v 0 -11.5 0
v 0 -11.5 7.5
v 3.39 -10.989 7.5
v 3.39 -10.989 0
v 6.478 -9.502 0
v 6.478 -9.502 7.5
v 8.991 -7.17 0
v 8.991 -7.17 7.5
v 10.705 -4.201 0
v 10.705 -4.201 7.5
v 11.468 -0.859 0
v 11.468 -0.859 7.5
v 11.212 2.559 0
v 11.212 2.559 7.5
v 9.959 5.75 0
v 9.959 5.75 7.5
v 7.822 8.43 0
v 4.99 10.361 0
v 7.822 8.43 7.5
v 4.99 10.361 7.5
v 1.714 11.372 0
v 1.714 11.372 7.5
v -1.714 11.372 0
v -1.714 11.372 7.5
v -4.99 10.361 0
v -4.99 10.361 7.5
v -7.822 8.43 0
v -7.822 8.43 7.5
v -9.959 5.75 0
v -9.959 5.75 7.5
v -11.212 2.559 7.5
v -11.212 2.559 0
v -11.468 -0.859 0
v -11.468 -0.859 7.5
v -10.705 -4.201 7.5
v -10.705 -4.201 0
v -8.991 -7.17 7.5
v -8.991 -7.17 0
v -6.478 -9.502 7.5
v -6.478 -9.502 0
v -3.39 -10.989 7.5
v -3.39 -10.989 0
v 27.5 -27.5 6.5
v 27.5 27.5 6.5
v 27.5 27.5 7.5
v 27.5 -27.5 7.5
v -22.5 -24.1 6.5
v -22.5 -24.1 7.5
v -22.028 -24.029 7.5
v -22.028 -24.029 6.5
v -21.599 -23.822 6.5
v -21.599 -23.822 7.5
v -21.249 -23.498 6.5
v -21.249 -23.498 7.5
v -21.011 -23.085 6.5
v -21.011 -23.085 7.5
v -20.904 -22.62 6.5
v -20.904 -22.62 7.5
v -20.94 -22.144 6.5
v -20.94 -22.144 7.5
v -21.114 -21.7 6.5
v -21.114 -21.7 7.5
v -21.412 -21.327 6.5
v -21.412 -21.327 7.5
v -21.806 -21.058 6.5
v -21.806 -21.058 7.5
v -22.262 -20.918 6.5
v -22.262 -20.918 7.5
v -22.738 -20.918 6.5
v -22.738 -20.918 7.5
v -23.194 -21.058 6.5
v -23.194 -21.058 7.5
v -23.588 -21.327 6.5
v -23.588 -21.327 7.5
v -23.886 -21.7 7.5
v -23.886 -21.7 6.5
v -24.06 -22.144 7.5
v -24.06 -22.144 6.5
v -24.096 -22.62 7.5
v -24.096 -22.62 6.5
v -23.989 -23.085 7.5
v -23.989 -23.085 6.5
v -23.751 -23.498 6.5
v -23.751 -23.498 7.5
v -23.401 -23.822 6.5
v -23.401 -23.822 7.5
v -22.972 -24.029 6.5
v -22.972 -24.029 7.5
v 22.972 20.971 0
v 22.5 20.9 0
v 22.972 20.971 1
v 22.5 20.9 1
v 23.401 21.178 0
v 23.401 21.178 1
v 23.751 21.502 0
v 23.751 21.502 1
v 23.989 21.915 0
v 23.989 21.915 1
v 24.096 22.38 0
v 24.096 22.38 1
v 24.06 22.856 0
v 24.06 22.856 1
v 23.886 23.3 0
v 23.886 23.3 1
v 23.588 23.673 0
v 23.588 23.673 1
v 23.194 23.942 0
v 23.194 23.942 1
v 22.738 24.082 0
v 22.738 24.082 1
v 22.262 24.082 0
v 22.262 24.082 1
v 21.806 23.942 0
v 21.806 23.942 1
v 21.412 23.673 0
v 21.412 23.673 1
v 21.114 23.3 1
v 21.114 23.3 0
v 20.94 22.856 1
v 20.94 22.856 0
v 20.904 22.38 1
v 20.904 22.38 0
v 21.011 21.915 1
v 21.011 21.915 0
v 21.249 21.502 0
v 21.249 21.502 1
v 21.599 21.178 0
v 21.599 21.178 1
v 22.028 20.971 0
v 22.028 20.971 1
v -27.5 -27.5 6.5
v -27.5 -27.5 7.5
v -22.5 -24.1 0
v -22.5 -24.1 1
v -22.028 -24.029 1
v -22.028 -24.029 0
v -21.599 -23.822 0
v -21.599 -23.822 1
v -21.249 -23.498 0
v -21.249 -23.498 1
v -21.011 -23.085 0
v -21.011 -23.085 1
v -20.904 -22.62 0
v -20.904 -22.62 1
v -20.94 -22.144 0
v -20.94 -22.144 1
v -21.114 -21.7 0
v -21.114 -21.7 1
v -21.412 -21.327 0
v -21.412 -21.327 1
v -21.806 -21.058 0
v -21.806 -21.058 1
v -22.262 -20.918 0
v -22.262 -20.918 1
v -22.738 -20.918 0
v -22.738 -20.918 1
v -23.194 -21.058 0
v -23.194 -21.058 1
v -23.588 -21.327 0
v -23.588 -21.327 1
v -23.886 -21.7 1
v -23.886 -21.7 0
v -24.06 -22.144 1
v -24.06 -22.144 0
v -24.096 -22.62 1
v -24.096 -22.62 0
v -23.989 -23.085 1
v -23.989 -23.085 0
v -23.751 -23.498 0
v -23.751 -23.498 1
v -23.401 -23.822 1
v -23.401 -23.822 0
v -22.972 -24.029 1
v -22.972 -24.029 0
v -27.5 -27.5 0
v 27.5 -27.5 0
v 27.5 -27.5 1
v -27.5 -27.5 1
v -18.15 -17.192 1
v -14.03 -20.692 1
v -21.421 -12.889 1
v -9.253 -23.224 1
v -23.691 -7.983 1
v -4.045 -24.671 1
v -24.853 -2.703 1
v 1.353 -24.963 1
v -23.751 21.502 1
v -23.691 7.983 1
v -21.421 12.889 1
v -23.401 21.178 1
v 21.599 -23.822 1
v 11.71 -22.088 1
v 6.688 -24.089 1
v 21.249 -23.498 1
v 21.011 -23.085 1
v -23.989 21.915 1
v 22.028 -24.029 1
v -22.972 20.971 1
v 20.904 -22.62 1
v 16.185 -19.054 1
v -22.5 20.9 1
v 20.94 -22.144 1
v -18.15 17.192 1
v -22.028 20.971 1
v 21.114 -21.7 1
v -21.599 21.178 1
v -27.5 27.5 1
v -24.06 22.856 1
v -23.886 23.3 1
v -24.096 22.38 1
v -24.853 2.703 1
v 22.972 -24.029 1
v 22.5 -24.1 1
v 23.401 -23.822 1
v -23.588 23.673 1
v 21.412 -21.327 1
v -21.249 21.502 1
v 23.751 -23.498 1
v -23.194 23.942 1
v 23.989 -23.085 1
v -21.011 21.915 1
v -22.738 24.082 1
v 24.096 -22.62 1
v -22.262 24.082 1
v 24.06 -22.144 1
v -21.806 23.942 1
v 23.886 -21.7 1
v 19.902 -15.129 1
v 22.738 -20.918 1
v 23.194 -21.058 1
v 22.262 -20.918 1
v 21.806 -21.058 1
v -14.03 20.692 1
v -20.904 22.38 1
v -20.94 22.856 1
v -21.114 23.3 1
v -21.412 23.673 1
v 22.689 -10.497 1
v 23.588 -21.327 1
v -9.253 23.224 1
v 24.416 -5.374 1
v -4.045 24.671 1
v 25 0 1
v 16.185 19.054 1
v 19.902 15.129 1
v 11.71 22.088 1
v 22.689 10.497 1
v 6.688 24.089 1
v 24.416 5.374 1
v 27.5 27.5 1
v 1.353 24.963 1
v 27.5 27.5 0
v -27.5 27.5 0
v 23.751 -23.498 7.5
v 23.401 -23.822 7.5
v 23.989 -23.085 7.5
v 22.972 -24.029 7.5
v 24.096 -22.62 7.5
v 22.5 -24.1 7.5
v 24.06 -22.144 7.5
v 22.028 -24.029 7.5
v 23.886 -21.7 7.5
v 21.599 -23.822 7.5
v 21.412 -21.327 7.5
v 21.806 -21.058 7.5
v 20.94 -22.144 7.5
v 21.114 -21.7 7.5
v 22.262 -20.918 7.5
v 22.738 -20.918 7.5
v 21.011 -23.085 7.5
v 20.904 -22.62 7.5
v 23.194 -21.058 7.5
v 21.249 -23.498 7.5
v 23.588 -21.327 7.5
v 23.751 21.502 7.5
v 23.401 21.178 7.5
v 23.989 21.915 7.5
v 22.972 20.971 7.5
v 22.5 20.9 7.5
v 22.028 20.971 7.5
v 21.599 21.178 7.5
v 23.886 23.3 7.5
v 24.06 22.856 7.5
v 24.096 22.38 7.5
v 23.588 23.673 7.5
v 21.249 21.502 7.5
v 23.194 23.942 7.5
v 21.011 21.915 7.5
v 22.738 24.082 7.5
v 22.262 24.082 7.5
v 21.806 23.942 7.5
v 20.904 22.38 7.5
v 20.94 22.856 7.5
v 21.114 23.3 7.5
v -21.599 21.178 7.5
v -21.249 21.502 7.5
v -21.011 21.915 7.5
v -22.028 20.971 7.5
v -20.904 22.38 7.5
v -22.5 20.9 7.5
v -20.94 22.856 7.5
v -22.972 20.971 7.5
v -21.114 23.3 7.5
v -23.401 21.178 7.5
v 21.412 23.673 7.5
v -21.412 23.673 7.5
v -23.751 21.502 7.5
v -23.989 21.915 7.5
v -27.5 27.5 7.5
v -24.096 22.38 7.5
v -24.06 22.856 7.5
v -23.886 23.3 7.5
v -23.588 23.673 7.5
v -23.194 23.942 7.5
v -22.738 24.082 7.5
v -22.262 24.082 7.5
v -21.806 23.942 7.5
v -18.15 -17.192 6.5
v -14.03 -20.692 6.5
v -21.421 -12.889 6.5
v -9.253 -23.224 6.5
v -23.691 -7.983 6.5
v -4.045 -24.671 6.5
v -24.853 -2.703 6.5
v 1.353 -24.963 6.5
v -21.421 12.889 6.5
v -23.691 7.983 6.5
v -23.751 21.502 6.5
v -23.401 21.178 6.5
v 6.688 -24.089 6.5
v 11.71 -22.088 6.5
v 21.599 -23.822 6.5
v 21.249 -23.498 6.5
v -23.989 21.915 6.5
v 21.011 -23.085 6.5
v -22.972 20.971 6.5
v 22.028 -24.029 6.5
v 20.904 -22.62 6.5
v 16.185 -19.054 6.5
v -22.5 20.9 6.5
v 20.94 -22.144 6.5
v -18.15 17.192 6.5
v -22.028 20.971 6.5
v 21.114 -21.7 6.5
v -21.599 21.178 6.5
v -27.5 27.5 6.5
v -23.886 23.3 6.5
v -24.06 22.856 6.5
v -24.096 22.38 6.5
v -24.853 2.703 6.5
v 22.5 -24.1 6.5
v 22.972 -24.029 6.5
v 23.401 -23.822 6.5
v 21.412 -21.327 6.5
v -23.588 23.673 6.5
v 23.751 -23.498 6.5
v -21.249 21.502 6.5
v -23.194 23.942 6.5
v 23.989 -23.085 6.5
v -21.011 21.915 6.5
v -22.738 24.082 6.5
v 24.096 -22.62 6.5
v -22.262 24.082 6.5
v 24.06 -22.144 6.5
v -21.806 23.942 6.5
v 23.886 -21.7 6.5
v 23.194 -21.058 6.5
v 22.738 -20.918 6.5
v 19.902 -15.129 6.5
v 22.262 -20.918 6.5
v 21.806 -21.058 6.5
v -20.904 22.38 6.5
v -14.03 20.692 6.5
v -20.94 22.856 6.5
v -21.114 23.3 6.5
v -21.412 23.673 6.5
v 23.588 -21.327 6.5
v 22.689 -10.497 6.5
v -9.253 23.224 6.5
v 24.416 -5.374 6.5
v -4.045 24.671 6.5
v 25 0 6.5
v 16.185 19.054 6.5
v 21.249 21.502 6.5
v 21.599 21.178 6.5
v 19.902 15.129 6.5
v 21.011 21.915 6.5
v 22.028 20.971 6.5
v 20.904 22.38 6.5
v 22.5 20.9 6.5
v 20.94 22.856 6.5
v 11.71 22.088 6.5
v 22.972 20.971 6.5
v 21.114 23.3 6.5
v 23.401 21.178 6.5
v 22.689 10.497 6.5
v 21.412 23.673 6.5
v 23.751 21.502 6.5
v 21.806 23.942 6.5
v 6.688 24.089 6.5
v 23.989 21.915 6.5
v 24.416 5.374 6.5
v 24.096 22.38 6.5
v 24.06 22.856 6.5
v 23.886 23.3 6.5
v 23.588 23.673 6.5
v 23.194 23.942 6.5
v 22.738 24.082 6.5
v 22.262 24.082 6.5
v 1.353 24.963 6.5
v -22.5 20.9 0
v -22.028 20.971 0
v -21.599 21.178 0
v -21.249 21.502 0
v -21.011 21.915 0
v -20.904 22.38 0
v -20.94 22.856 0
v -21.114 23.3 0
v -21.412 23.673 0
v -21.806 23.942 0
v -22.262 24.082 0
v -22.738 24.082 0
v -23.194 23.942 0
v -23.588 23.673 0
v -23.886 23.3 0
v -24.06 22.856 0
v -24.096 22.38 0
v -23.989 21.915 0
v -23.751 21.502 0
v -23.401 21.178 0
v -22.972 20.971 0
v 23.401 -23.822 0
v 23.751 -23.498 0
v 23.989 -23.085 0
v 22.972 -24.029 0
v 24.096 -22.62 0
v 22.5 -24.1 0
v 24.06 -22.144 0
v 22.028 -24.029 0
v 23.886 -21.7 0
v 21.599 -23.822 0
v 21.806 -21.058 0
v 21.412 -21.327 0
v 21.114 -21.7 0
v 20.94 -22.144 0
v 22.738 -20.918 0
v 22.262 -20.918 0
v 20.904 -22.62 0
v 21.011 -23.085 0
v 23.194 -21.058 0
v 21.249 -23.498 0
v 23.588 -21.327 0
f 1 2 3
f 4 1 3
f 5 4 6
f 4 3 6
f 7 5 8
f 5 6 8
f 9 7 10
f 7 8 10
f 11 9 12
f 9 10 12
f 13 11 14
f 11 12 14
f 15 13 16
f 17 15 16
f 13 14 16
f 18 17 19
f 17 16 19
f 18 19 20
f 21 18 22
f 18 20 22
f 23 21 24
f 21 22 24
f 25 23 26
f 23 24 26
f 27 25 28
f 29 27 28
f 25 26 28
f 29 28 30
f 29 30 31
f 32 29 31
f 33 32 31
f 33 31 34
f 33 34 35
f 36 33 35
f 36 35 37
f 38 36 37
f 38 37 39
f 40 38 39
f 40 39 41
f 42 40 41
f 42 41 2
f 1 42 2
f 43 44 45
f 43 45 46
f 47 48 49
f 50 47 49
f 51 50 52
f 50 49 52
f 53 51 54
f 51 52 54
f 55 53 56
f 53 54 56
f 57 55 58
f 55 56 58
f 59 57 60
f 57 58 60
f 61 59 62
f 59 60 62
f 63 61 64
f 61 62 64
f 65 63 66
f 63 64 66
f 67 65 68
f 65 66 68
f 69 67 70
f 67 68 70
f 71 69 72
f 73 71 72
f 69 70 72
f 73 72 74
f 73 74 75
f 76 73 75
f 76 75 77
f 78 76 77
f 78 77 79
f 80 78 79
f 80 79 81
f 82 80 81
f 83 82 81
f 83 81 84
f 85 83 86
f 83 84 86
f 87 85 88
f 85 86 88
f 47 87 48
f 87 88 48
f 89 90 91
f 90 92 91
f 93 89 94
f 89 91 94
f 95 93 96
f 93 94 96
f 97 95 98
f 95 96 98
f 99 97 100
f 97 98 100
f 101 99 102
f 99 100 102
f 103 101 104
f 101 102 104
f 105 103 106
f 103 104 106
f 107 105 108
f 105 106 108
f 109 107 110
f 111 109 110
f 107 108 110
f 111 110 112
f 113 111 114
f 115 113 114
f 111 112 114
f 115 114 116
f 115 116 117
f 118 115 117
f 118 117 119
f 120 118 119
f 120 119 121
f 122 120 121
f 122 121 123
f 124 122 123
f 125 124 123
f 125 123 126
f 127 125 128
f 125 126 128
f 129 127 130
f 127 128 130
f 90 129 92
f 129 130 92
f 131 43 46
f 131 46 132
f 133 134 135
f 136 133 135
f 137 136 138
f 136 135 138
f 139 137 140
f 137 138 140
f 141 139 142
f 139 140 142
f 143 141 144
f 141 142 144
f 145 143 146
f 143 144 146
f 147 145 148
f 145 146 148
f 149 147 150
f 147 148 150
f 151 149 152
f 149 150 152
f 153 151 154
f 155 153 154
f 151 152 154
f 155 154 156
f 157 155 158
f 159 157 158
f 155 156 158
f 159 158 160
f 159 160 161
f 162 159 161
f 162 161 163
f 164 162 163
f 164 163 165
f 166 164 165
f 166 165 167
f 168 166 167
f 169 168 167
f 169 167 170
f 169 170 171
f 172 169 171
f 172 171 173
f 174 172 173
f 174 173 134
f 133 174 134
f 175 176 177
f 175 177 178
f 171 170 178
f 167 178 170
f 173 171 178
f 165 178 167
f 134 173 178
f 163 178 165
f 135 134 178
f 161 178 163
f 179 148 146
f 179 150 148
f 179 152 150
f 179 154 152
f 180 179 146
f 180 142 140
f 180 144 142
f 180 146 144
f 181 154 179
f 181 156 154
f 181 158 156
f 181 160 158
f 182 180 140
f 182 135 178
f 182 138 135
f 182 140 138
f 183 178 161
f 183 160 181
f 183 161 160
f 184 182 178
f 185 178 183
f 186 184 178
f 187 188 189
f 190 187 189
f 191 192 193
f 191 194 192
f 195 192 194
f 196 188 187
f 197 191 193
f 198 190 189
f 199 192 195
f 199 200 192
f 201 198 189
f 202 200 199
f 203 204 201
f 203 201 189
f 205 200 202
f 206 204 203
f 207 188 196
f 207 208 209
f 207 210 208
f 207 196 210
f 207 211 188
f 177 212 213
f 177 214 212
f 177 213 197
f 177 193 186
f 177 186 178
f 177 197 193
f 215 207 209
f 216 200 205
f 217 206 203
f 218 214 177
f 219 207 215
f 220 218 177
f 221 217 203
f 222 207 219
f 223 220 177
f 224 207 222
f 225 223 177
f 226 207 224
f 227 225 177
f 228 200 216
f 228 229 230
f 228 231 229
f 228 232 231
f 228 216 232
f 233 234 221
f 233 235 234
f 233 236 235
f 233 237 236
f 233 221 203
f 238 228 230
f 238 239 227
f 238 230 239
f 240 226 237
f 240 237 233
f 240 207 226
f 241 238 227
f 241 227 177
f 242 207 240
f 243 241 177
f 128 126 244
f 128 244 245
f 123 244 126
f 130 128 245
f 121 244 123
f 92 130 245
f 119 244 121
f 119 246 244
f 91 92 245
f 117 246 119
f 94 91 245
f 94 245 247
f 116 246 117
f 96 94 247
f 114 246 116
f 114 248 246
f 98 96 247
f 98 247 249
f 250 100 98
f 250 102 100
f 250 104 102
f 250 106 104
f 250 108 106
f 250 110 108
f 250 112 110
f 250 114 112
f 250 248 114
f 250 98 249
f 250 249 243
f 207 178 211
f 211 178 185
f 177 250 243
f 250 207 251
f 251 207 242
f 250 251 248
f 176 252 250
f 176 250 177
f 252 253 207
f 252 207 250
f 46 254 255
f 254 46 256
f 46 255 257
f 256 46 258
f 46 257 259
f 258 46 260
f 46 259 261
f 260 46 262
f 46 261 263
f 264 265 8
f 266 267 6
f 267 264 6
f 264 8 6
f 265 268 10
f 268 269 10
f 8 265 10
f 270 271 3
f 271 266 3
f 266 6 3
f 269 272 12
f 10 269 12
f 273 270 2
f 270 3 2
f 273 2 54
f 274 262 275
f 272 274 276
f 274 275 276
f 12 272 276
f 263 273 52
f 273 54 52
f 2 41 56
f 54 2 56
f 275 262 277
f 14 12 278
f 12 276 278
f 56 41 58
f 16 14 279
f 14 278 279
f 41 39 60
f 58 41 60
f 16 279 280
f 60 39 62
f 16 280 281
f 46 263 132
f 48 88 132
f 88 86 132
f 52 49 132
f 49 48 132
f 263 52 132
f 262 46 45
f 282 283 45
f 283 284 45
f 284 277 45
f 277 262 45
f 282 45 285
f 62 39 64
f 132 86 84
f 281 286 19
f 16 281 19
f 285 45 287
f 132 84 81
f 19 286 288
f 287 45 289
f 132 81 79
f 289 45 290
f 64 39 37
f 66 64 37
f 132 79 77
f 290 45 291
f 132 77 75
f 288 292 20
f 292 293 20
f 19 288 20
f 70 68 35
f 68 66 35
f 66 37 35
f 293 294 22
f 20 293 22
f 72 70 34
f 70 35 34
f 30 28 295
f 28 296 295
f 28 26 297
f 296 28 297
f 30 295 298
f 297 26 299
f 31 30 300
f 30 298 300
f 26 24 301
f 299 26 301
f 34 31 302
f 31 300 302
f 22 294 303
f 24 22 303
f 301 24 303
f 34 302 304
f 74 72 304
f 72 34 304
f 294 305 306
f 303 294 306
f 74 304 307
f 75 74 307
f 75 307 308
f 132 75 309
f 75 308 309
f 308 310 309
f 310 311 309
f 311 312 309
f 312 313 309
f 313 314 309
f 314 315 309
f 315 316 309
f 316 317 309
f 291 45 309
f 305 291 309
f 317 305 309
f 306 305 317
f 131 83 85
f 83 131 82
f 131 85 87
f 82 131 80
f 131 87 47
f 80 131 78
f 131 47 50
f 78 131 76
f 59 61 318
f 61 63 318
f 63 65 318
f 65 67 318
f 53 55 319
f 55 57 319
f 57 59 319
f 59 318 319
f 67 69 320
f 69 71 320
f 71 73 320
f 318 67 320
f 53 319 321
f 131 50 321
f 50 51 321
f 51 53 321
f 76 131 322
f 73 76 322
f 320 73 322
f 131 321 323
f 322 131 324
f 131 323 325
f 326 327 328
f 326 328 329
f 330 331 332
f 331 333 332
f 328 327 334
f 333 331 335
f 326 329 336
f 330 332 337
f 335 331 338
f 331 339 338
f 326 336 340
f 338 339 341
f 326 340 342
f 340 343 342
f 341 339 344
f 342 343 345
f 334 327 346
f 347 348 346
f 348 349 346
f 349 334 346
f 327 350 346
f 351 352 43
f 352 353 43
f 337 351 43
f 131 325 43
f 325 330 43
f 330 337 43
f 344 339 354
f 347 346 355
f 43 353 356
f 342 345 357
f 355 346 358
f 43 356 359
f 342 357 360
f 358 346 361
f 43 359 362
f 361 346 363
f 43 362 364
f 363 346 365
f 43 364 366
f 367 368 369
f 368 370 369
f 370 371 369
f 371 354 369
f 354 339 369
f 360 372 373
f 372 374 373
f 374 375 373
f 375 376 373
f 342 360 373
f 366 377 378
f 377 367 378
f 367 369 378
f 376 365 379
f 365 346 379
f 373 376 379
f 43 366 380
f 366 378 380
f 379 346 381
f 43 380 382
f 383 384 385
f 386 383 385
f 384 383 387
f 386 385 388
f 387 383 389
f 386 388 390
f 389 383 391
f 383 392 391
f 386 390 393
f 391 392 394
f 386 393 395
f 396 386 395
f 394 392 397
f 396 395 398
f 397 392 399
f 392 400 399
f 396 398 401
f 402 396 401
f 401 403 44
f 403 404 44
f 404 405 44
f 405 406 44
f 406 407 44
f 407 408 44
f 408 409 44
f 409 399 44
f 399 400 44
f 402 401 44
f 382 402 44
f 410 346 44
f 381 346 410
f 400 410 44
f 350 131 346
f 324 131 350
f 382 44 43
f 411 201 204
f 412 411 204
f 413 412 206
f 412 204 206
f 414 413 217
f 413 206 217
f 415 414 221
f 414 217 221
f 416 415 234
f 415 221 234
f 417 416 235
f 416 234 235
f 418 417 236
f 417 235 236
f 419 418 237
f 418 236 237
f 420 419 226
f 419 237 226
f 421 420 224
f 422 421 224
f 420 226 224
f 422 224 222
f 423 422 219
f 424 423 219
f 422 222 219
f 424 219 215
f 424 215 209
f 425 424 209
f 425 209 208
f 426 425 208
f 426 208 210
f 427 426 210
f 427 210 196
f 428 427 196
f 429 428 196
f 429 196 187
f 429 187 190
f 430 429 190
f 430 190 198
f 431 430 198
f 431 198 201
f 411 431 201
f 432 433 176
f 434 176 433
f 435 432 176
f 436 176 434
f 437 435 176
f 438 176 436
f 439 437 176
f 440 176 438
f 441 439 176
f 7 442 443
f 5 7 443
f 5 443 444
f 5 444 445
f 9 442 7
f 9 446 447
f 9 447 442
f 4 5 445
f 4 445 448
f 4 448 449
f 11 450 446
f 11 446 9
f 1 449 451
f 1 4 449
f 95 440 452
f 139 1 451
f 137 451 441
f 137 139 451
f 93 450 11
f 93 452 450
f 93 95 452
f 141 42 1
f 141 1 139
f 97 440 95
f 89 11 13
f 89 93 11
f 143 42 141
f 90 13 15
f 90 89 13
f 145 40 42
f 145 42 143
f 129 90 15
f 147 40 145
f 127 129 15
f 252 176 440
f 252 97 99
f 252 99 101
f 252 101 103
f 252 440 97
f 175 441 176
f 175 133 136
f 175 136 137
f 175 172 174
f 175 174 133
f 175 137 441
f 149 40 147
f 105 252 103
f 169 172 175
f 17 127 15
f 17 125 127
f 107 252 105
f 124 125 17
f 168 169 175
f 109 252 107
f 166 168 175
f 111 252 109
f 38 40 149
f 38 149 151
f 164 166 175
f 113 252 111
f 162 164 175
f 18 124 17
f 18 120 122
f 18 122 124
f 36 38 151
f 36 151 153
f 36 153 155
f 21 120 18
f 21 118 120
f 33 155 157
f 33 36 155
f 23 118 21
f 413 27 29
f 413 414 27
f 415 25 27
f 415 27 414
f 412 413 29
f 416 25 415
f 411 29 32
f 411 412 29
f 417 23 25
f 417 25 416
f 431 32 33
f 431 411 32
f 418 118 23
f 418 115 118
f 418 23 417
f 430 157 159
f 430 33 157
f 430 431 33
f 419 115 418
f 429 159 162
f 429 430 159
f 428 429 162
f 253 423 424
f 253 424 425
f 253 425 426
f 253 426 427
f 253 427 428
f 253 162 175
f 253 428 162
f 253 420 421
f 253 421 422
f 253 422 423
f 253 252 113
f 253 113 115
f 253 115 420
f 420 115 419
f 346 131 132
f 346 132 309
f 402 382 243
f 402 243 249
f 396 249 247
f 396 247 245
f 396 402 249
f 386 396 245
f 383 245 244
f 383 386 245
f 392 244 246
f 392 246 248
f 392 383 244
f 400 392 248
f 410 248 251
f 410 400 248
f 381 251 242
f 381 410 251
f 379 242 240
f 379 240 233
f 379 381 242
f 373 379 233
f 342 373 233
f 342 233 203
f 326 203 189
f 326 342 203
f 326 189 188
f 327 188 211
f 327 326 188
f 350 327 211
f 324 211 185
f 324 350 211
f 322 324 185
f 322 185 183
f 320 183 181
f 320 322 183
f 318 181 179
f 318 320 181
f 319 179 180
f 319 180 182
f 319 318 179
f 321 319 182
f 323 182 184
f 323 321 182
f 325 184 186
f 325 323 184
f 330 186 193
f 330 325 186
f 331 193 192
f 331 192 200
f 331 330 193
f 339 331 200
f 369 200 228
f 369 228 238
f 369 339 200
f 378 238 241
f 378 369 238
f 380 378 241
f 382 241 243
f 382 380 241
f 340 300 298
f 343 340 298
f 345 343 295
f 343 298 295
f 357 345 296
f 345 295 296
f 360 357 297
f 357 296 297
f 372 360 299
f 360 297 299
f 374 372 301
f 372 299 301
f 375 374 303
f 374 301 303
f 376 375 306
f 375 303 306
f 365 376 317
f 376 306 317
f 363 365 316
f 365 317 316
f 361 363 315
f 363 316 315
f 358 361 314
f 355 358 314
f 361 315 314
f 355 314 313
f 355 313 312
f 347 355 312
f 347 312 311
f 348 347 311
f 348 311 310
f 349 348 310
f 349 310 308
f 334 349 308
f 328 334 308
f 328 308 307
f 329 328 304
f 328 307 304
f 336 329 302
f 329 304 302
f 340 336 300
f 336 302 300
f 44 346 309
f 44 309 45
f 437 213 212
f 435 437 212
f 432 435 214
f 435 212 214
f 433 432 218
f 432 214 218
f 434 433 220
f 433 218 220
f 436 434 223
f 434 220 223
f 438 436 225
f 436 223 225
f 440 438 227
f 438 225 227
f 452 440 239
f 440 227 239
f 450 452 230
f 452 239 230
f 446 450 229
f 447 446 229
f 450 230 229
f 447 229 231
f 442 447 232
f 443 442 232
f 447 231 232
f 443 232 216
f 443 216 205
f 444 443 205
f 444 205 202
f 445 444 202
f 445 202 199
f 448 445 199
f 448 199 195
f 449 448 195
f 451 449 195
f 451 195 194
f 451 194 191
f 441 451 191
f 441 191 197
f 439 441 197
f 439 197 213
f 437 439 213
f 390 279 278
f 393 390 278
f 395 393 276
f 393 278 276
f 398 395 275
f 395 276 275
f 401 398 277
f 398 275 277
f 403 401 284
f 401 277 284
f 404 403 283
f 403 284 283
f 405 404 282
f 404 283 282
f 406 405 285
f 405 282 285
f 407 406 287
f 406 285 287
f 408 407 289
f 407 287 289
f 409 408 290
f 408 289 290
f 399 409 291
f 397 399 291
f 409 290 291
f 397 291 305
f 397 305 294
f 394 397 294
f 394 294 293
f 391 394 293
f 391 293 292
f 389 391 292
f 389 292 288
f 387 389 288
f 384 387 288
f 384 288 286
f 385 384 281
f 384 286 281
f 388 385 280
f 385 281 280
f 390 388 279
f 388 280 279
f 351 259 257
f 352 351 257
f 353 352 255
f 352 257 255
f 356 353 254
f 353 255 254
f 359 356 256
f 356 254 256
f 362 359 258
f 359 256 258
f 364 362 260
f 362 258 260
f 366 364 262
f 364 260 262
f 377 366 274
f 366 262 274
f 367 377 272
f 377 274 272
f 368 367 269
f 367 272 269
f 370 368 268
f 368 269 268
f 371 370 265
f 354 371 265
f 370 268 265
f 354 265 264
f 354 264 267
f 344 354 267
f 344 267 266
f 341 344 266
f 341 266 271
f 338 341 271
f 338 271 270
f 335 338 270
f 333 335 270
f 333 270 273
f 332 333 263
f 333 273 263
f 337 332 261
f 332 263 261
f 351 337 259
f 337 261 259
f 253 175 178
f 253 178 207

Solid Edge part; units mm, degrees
sketch "Sketch1" plane through (0, 0, 0) normal (0, 0, 1) x (1, 0, 0)
  line L0 (27.5, -27.5) -> (-27.5, -27.5)
  line L1 (-27.5, -27.5) -> (-27.5, 27.5)
  line L2 (-27.5, 27.5) -> (27.5, 27.5)
  line L3 (27.5, 27.5) -> (27.5, -27.5)
  dimension "D1" = 55
  dimension "D2" = 55
extrude "Protrusion1" add sketch "Sketch1" along normal blind 7.5
sketch "Sketch2" plane through (0, 0, 6.5) normal (0, 0, 1) x (1, 0, 0)
  circle A0 centre (0, 0) radius 25
extrude "ExtrudedCutout_1" cut sketch "Sketch2" against normal blind 5.5 flip side to cut
hole "Hole_1" at (0, 0, 7.5) direction (0, 0, -1) diameter 23 end through all
hole "Hole_2" at (-22.5, 22.5, 7.5) direction (0, 0, -1) diameter 3.2 end through all
hole "Hole1" at (-22.5, -22.5, 7.5) direction (0, 0, -1) diameter 3.2 end through all
hole "Hole2" at (22.5, -22.5, 7.5) direction (0, 0, -1) diameter 3.2 end through all
hole "Hole3" at (22.5, 22.5, 7.5) direction (0, 0, -1) diameter 3.2 end through all
